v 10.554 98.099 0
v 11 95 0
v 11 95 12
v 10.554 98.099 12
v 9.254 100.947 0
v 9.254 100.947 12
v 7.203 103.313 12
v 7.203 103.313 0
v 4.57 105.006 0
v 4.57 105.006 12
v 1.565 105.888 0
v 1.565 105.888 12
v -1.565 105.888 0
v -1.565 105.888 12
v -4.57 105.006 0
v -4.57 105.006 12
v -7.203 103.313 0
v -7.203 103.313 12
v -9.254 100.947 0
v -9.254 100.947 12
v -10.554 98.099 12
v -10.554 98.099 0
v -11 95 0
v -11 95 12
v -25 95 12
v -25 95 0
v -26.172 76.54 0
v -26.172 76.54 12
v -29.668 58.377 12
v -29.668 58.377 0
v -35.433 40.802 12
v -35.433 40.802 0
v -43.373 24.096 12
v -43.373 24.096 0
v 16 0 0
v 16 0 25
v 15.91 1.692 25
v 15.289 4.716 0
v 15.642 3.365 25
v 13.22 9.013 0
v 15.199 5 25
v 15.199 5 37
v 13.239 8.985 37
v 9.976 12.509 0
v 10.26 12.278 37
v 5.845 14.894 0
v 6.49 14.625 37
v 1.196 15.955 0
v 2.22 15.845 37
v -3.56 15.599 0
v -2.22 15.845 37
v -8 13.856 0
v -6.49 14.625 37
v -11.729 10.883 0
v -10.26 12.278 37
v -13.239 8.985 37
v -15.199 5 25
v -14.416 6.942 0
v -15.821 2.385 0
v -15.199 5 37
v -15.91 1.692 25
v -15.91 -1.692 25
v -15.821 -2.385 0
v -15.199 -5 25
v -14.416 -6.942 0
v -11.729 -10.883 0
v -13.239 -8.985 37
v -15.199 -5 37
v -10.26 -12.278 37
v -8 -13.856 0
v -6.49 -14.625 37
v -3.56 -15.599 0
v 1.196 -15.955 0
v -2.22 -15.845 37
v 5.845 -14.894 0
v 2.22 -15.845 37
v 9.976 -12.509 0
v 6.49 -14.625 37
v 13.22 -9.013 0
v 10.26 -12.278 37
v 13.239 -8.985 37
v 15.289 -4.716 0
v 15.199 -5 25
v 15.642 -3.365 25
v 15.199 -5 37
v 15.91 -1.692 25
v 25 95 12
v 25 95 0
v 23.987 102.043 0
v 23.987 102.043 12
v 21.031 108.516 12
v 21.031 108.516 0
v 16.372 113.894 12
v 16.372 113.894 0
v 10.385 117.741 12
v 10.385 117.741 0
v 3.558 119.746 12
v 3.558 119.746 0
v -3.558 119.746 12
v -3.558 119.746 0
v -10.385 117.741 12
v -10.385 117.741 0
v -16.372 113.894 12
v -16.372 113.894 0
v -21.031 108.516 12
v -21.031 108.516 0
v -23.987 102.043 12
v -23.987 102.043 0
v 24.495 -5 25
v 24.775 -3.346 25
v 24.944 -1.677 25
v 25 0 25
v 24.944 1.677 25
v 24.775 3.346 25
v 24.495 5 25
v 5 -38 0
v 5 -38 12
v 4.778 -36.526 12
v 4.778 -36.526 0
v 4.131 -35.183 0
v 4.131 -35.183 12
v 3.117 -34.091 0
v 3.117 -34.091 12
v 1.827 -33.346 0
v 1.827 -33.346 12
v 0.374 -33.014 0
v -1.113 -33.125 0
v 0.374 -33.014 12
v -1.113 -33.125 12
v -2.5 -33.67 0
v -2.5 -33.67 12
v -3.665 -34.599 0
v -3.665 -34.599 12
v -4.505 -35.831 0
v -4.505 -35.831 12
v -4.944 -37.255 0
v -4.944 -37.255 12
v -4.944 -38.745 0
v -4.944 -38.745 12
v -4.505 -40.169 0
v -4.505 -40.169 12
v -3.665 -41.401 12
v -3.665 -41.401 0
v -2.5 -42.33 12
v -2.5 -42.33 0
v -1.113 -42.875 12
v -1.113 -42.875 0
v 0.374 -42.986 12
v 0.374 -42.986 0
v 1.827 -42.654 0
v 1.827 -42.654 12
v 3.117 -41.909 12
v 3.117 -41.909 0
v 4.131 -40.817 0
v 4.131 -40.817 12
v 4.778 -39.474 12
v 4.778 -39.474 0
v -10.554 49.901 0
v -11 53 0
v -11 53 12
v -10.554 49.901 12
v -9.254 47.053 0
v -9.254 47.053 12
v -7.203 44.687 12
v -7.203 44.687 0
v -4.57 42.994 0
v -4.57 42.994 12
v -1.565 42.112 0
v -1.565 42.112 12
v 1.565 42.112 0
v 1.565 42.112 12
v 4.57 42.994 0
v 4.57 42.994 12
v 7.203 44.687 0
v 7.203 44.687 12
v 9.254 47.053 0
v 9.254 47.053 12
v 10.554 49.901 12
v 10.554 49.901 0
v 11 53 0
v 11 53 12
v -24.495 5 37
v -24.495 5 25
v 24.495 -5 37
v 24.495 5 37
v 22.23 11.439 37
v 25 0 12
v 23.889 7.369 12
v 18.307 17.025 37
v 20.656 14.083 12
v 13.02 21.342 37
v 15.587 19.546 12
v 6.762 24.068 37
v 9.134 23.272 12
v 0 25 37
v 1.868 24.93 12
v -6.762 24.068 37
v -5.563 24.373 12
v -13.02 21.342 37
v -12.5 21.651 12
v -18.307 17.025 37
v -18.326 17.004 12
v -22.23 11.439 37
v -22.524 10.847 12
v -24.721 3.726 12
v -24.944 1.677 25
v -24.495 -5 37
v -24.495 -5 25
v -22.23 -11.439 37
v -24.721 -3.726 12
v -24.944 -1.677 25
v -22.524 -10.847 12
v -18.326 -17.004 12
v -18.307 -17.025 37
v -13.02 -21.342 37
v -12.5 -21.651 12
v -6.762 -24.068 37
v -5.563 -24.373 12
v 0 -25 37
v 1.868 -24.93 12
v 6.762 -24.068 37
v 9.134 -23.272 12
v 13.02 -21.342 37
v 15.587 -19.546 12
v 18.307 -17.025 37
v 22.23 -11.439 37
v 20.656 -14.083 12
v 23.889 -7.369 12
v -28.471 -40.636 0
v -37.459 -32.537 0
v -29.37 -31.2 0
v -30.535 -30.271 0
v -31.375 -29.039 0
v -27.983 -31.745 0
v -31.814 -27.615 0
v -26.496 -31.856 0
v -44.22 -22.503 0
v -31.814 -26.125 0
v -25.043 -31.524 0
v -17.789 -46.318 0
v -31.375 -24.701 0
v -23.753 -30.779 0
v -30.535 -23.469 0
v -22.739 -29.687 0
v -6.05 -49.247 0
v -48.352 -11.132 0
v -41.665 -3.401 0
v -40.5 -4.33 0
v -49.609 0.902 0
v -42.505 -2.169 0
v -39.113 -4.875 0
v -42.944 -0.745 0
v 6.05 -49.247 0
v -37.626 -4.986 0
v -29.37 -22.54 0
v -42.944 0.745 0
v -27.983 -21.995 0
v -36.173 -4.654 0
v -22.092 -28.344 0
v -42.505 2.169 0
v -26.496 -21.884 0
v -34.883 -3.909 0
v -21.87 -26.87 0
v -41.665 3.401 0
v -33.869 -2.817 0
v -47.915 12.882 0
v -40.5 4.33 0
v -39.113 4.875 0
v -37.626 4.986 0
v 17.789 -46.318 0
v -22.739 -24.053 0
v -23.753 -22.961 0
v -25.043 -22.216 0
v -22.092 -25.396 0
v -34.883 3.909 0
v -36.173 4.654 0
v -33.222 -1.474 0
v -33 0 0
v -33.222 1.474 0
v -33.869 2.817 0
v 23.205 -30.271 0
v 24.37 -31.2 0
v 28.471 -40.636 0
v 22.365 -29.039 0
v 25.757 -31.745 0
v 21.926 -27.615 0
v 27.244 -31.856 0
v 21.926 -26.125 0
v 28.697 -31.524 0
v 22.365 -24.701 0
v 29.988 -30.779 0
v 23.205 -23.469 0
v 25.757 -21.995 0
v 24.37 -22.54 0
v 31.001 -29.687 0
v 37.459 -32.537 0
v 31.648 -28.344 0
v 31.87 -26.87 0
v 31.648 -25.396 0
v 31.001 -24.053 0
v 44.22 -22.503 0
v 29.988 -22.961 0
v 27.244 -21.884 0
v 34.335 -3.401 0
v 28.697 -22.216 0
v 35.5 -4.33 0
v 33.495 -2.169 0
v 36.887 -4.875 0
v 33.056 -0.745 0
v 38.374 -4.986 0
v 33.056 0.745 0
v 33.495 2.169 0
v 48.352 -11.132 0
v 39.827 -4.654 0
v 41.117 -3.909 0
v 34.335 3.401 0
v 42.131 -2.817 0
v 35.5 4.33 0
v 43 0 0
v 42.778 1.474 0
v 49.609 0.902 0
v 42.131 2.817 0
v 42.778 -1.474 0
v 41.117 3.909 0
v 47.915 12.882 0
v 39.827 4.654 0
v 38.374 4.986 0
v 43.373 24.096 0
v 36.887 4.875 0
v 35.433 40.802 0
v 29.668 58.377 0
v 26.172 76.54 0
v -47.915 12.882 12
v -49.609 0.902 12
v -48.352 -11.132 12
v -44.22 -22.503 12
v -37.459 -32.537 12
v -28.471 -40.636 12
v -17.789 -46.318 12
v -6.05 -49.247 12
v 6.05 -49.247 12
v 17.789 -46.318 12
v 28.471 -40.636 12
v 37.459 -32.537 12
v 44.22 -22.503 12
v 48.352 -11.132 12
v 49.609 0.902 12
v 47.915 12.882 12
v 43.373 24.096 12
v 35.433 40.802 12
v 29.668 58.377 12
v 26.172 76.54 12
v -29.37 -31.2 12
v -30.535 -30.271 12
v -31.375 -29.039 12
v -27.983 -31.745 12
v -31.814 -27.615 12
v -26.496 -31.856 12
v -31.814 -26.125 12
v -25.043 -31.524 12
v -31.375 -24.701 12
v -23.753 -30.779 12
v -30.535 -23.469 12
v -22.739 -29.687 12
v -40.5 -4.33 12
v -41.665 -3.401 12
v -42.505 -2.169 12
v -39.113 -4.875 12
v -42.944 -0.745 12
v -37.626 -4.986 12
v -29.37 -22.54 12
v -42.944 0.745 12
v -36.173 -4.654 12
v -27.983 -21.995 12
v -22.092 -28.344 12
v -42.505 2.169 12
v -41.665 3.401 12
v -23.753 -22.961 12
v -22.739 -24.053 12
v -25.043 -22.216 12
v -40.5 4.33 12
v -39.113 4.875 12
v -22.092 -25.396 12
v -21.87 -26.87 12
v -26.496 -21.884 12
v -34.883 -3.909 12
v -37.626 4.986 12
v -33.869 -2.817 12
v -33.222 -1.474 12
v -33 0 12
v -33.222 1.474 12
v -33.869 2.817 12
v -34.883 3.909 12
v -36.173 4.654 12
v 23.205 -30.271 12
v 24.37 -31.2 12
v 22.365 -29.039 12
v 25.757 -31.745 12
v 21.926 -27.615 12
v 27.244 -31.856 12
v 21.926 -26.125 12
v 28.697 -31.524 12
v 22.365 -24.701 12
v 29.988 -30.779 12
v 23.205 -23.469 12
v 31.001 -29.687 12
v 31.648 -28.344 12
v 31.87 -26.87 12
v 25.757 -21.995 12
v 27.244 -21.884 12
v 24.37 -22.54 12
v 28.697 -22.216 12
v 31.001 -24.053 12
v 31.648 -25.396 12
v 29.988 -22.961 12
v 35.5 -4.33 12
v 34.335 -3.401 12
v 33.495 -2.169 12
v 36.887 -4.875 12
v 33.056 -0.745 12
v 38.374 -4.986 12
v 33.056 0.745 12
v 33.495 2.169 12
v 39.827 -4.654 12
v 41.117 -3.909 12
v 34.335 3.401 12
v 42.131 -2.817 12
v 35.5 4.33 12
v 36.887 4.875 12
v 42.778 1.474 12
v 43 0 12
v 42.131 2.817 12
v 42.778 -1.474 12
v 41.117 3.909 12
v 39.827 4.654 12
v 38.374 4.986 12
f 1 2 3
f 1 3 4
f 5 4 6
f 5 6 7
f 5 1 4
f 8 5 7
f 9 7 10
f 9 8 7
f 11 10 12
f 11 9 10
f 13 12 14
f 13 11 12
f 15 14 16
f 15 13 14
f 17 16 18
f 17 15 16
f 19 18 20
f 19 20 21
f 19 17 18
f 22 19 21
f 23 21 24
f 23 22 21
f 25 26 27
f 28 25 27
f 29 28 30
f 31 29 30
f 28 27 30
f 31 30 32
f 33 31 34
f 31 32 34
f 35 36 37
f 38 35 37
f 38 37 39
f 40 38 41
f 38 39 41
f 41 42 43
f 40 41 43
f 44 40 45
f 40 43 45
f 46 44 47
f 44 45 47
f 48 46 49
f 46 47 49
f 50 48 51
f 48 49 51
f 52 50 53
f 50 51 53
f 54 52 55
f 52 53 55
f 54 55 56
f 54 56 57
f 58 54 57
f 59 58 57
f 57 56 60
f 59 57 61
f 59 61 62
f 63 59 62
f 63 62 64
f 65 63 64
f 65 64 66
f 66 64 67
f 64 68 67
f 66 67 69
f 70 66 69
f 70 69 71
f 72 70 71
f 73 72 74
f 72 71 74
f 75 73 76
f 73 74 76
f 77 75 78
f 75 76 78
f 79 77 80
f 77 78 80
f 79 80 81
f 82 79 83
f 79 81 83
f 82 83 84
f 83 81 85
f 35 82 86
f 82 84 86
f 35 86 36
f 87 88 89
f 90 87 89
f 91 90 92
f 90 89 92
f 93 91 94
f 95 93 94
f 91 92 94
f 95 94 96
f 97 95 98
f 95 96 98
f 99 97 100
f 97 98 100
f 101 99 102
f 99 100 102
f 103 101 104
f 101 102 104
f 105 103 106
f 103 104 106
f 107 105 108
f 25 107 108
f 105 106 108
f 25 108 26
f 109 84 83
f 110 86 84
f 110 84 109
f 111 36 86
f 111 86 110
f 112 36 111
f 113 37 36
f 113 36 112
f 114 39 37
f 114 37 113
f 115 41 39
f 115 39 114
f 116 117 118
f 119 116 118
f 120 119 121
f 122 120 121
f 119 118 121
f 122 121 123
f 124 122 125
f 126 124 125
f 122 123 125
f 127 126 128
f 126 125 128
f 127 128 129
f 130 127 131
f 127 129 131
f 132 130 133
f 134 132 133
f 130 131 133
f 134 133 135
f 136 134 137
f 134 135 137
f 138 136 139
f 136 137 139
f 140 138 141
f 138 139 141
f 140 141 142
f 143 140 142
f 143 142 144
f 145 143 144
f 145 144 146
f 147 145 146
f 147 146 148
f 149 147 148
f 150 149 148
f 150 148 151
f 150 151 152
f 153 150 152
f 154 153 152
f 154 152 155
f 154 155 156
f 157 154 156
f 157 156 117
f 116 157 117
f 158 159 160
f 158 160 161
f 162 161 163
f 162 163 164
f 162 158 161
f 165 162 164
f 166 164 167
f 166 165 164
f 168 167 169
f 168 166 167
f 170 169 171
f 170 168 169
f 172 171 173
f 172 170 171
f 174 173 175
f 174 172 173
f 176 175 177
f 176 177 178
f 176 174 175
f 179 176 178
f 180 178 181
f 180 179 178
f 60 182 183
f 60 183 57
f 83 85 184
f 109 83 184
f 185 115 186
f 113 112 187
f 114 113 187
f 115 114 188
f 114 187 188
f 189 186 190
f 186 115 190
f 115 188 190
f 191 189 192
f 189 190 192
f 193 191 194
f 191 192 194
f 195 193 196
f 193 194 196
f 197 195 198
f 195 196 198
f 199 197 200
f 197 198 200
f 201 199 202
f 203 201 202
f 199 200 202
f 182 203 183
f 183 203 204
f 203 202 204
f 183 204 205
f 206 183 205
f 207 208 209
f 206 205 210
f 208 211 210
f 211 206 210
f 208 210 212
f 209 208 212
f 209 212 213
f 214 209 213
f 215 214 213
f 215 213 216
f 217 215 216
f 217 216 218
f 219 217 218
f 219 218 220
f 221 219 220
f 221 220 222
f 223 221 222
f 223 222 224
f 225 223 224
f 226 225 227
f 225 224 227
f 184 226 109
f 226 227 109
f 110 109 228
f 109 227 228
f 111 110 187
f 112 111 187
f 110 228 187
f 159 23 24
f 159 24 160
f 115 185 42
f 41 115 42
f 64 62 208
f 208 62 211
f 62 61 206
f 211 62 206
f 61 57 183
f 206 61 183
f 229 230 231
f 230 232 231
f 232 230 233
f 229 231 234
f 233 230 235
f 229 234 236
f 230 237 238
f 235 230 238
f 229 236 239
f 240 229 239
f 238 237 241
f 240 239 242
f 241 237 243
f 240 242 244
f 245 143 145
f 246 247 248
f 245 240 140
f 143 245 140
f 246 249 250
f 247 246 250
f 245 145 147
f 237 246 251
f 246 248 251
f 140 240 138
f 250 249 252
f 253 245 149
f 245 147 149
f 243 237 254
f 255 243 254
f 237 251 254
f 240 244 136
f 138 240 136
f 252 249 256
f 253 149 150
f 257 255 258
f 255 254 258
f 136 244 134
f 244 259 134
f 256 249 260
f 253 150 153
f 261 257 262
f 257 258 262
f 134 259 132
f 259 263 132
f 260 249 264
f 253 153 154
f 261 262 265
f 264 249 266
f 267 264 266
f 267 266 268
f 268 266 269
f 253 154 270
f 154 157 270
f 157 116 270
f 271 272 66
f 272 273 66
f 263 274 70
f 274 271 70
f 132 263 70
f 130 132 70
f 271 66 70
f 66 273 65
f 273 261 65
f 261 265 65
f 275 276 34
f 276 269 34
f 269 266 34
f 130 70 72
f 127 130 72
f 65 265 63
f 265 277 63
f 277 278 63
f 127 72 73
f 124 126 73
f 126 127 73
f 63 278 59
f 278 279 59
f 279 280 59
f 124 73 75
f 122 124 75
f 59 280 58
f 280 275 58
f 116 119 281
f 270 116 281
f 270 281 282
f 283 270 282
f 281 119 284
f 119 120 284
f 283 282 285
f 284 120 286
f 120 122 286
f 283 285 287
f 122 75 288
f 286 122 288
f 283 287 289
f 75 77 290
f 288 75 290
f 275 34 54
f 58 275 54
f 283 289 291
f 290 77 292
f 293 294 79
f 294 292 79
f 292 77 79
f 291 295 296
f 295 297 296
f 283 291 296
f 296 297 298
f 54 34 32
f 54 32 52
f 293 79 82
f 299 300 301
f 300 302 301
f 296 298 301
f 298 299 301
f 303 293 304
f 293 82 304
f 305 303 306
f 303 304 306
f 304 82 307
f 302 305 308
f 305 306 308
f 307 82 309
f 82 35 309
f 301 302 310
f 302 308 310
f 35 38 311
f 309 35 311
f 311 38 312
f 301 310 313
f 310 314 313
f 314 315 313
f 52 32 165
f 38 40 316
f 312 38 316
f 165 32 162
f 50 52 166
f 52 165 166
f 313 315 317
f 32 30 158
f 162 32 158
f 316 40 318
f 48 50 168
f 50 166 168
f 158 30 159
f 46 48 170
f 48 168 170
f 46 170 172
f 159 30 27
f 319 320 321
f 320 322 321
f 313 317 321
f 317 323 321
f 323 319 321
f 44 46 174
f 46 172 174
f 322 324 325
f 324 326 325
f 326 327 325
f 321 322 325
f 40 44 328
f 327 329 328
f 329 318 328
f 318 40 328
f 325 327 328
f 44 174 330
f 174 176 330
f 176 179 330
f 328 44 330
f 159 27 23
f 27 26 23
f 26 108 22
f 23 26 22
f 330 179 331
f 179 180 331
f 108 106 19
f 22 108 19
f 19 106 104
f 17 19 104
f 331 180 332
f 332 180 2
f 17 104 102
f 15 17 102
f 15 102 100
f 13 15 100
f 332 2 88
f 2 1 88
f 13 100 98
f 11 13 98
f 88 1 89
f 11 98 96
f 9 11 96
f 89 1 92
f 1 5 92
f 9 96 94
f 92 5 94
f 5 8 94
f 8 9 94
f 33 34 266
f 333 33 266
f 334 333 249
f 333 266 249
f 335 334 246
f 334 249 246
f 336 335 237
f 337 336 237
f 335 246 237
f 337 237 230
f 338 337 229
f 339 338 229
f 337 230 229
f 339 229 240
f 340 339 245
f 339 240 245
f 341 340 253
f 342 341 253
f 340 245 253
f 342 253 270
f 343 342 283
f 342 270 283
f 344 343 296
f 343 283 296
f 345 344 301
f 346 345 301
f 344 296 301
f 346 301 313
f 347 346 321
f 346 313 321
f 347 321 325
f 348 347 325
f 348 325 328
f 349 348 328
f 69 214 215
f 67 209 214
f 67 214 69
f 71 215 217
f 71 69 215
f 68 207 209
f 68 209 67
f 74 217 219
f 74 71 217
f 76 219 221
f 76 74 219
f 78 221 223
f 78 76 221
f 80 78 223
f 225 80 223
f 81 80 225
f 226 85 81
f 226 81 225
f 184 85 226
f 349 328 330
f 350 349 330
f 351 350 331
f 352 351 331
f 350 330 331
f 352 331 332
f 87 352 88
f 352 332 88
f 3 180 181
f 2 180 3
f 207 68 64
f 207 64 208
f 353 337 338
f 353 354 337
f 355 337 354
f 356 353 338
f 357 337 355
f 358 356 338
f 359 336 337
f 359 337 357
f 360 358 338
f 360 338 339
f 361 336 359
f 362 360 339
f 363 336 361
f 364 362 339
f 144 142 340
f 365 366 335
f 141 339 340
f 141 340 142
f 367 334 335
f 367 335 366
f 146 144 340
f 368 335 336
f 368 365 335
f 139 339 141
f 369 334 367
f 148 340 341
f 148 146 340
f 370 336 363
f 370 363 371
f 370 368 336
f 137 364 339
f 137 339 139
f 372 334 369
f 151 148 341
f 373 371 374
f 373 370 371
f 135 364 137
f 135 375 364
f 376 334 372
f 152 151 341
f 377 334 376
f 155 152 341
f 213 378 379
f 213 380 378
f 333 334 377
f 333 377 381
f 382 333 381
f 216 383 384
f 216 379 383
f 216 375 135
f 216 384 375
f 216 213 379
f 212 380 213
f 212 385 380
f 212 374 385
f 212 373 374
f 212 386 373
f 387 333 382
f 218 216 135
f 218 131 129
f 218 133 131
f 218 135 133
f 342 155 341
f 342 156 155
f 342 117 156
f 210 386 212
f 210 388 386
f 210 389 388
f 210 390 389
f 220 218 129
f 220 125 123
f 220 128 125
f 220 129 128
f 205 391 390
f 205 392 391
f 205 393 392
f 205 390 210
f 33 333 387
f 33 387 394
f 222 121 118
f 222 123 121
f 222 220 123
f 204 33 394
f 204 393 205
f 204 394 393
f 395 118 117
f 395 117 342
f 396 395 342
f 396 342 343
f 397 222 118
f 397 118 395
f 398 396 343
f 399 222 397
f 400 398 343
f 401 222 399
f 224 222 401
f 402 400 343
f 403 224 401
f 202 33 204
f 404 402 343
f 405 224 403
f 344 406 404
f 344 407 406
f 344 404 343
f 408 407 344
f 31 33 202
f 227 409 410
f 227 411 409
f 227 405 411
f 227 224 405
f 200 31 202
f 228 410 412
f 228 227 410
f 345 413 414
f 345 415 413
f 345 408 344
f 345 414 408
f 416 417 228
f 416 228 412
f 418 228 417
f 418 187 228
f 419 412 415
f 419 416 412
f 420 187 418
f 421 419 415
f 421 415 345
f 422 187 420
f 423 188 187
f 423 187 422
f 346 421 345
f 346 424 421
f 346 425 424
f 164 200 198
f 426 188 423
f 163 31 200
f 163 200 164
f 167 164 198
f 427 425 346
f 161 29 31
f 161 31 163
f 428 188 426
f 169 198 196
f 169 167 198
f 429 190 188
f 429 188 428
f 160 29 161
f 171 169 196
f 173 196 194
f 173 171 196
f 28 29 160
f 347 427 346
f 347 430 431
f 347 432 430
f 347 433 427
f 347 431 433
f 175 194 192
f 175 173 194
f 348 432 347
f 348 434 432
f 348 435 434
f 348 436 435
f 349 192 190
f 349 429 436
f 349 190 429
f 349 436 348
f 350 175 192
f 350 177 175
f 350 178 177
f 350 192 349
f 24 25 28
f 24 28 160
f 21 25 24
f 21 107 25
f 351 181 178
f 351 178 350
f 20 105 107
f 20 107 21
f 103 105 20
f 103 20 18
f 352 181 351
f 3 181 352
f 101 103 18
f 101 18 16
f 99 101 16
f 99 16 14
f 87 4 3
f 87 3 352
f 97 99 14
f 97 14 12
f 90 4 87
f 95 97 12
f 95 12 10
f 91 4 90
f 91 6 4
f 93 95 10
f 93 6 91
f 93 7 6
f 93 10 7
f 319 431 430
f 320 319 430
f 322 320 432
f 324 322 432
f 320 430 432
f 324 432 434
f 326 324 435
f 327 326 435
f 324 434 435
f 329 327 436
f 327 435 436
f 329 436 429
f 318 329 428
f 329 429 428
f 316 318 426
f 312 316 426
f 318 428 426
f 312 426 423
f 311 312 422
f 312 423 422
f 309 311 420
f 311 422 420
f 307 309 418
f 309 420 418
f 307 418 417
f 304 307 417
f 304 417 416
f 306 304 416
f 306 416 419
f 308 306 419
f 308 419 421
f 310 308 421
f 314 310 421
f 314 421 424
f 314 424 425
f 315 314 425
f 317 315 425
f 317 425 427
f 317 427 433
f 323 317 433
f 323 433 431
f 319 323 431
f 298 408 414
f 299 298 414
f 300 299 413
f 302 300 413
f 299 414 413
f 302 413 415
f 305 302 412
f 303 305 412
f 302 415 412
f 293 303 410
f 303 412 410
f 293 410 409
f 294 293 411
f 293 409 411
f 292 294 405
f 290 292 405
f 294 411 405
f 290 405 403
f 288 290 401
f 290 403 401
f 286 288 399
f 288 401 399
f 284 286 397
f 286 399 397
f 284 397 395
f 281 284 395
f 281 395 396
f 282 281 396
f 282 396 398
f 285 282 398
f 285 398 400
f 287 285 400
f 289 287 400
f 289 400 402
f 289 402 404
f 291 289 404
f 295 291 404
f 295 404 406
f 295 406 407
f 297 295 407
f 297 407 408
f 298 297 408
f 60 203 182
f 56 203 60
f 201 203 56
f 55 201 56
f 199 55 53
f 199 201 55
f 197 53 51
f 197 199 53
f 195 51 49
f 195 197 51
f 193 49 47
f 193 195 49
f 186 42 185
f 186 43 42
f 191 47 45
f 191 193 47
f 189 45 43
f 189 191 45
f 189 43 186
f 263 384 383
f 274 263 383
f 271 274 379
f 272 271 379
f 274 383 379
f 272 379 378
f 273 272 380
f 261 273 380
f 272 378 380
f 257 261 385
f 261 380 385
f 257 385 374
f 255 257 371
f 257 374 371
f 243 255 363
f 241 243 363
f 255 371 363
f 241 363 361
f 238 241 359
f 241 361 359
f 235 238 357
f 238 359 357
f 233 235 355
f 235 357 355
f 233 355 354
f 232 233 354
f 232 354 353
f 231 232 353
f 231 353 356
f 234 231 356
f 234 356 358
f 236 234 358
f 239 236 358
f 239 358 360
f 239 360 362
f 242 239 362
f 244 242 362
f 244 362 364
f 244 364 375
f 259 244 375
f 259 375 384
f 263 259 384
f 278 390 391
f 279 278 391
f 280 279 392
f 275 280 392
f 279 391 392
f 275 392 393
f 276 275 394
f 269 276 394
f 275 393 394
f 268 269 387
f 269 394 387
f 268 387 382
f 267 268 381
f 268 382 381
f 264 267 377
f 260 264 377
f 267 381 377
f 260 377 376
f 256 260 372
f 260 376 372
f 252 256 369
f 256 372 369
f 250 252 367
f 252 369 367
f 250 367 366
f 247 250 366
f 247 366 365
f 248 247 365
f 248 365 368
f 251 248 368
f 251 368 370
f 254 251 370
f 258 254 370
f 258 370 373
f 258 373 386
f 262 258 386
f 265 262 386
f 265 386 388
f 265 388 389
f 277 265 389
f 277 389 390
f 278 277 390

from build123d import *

# Parameters (mm, degrees)
EXTRUDE_1_DEPTH     = 12
SKETCH_2_R          = 5
CUT_EXTRUDE_1_DEPTH = 131.40645681
SKETCH_3_R          = 25
EXTRUDE_2_DEPTH     = 25
SKETCH_4_R          = 16
CUT_EXTRUDE_2_DEPTH = 136.021642627
CUT_EXTRUDE_3_DEPTH = 12


with BuildPart() as part:
    # 草圖1 → 填料-伸長1 (new body)
    with BuildSketch(Plane.XY):
        with BuildLine():
            ThreePointArc((25, 95), (0, 120), (-25, 95))
            ThreePointArc((-25, 95), (-29.667879628, 58.377168991), (-43.373037686, 24.096132048))
            ThreePointArc((-43.373037686, 24.096132048), (0, -49.616972679), (43.373037686, 24.096132048))
            ThreePointArc((43.373037686, 24.096132048), (29.667879628, 58.377168991), (25, 95))
        make_face()
        with BuildLine():
            Line((-11, 95), (-11, 53))
            ThreePointArc((-11, 53), (0, 42), (11, 53))
            Line((11, 53), (11, 95))
            ThreePointArc((11, 95), (0, 106), (-11, 95))
        make_face(mode=Mode.SUBTRACT)
    extrude(amount=EXTRUDE_1_DEPTH)

    # 草圖2 → 除料-伸長1 (cut, through all)
    with BuildSketch(Plane.XY.offset(12)):
        with Locations((38, 0)):
            Circle(SKETCH_2_R)
        with Locations((-38, 0)):
            Circle(SKETCH_2_R)
        with Locations((-26.870057685, -26.870057685)):
            Circle(SKETCH_2_R)
        with Locations((0, -38)):
            Circle(SKETCH_2_R)
        with Locations((26.870057685, -26.870057685)):
            Circle(SKETCH_2_R)
    extrude(amount=-CUT_EXTRUDE_1_DEPTH, mode=Mode.SUBTRACT)

    # 草圖3 → 填料-伸長2 (add)
    with BuildSketch(Plane.XY.offset(12)):
        Circle(SKETCH_3_R)
    extrude(amount=EXTRUDE_2_DEPTH)

    # 草圖4 → 除料-伸長2 (cut, through all)
    with BuildSketch(Plane.XY.offset(37)):
        Circle(SKETCH_4_R)
    extrude(amount=-CUT_EXTRUDE_2_DEPTH, mode=Mode.SUBTRACT)

    # 草圖5 → 除料-伸長3 (cut)
    with BuildSketch(Plane.XY.offset(37)):
        with BuildLine():
            Line((-24.494897428, 5), (-15.198684154, 5))
            ThreePointArc((-15.198684154, 5), (-16, 0), (-15.198684154, -5))
            Line((-15.198684154, -5), (-24.494897428, -5))
            ThreePointArc((-24.494897428, -5), (-25, 0), (-24.494897428, 5))
        make_face()
        with BuildLine():
            Line((15.198684154, -5), (24.494897428, -5))
            ThreePointArc((24.494897428, -5), (25, 0), (24.494897428, 5))
            Line((24.494897428, 5), (15.198684154, 5))
            ThreePointArc((15.198684154, 5), (16, 0), (15.198684154, -5))
        make_face()
    extrude(amount=-CUT_EXTRUDE_3_DEPTH, mode=Mode.SUBTRACT)


solid = part.part
